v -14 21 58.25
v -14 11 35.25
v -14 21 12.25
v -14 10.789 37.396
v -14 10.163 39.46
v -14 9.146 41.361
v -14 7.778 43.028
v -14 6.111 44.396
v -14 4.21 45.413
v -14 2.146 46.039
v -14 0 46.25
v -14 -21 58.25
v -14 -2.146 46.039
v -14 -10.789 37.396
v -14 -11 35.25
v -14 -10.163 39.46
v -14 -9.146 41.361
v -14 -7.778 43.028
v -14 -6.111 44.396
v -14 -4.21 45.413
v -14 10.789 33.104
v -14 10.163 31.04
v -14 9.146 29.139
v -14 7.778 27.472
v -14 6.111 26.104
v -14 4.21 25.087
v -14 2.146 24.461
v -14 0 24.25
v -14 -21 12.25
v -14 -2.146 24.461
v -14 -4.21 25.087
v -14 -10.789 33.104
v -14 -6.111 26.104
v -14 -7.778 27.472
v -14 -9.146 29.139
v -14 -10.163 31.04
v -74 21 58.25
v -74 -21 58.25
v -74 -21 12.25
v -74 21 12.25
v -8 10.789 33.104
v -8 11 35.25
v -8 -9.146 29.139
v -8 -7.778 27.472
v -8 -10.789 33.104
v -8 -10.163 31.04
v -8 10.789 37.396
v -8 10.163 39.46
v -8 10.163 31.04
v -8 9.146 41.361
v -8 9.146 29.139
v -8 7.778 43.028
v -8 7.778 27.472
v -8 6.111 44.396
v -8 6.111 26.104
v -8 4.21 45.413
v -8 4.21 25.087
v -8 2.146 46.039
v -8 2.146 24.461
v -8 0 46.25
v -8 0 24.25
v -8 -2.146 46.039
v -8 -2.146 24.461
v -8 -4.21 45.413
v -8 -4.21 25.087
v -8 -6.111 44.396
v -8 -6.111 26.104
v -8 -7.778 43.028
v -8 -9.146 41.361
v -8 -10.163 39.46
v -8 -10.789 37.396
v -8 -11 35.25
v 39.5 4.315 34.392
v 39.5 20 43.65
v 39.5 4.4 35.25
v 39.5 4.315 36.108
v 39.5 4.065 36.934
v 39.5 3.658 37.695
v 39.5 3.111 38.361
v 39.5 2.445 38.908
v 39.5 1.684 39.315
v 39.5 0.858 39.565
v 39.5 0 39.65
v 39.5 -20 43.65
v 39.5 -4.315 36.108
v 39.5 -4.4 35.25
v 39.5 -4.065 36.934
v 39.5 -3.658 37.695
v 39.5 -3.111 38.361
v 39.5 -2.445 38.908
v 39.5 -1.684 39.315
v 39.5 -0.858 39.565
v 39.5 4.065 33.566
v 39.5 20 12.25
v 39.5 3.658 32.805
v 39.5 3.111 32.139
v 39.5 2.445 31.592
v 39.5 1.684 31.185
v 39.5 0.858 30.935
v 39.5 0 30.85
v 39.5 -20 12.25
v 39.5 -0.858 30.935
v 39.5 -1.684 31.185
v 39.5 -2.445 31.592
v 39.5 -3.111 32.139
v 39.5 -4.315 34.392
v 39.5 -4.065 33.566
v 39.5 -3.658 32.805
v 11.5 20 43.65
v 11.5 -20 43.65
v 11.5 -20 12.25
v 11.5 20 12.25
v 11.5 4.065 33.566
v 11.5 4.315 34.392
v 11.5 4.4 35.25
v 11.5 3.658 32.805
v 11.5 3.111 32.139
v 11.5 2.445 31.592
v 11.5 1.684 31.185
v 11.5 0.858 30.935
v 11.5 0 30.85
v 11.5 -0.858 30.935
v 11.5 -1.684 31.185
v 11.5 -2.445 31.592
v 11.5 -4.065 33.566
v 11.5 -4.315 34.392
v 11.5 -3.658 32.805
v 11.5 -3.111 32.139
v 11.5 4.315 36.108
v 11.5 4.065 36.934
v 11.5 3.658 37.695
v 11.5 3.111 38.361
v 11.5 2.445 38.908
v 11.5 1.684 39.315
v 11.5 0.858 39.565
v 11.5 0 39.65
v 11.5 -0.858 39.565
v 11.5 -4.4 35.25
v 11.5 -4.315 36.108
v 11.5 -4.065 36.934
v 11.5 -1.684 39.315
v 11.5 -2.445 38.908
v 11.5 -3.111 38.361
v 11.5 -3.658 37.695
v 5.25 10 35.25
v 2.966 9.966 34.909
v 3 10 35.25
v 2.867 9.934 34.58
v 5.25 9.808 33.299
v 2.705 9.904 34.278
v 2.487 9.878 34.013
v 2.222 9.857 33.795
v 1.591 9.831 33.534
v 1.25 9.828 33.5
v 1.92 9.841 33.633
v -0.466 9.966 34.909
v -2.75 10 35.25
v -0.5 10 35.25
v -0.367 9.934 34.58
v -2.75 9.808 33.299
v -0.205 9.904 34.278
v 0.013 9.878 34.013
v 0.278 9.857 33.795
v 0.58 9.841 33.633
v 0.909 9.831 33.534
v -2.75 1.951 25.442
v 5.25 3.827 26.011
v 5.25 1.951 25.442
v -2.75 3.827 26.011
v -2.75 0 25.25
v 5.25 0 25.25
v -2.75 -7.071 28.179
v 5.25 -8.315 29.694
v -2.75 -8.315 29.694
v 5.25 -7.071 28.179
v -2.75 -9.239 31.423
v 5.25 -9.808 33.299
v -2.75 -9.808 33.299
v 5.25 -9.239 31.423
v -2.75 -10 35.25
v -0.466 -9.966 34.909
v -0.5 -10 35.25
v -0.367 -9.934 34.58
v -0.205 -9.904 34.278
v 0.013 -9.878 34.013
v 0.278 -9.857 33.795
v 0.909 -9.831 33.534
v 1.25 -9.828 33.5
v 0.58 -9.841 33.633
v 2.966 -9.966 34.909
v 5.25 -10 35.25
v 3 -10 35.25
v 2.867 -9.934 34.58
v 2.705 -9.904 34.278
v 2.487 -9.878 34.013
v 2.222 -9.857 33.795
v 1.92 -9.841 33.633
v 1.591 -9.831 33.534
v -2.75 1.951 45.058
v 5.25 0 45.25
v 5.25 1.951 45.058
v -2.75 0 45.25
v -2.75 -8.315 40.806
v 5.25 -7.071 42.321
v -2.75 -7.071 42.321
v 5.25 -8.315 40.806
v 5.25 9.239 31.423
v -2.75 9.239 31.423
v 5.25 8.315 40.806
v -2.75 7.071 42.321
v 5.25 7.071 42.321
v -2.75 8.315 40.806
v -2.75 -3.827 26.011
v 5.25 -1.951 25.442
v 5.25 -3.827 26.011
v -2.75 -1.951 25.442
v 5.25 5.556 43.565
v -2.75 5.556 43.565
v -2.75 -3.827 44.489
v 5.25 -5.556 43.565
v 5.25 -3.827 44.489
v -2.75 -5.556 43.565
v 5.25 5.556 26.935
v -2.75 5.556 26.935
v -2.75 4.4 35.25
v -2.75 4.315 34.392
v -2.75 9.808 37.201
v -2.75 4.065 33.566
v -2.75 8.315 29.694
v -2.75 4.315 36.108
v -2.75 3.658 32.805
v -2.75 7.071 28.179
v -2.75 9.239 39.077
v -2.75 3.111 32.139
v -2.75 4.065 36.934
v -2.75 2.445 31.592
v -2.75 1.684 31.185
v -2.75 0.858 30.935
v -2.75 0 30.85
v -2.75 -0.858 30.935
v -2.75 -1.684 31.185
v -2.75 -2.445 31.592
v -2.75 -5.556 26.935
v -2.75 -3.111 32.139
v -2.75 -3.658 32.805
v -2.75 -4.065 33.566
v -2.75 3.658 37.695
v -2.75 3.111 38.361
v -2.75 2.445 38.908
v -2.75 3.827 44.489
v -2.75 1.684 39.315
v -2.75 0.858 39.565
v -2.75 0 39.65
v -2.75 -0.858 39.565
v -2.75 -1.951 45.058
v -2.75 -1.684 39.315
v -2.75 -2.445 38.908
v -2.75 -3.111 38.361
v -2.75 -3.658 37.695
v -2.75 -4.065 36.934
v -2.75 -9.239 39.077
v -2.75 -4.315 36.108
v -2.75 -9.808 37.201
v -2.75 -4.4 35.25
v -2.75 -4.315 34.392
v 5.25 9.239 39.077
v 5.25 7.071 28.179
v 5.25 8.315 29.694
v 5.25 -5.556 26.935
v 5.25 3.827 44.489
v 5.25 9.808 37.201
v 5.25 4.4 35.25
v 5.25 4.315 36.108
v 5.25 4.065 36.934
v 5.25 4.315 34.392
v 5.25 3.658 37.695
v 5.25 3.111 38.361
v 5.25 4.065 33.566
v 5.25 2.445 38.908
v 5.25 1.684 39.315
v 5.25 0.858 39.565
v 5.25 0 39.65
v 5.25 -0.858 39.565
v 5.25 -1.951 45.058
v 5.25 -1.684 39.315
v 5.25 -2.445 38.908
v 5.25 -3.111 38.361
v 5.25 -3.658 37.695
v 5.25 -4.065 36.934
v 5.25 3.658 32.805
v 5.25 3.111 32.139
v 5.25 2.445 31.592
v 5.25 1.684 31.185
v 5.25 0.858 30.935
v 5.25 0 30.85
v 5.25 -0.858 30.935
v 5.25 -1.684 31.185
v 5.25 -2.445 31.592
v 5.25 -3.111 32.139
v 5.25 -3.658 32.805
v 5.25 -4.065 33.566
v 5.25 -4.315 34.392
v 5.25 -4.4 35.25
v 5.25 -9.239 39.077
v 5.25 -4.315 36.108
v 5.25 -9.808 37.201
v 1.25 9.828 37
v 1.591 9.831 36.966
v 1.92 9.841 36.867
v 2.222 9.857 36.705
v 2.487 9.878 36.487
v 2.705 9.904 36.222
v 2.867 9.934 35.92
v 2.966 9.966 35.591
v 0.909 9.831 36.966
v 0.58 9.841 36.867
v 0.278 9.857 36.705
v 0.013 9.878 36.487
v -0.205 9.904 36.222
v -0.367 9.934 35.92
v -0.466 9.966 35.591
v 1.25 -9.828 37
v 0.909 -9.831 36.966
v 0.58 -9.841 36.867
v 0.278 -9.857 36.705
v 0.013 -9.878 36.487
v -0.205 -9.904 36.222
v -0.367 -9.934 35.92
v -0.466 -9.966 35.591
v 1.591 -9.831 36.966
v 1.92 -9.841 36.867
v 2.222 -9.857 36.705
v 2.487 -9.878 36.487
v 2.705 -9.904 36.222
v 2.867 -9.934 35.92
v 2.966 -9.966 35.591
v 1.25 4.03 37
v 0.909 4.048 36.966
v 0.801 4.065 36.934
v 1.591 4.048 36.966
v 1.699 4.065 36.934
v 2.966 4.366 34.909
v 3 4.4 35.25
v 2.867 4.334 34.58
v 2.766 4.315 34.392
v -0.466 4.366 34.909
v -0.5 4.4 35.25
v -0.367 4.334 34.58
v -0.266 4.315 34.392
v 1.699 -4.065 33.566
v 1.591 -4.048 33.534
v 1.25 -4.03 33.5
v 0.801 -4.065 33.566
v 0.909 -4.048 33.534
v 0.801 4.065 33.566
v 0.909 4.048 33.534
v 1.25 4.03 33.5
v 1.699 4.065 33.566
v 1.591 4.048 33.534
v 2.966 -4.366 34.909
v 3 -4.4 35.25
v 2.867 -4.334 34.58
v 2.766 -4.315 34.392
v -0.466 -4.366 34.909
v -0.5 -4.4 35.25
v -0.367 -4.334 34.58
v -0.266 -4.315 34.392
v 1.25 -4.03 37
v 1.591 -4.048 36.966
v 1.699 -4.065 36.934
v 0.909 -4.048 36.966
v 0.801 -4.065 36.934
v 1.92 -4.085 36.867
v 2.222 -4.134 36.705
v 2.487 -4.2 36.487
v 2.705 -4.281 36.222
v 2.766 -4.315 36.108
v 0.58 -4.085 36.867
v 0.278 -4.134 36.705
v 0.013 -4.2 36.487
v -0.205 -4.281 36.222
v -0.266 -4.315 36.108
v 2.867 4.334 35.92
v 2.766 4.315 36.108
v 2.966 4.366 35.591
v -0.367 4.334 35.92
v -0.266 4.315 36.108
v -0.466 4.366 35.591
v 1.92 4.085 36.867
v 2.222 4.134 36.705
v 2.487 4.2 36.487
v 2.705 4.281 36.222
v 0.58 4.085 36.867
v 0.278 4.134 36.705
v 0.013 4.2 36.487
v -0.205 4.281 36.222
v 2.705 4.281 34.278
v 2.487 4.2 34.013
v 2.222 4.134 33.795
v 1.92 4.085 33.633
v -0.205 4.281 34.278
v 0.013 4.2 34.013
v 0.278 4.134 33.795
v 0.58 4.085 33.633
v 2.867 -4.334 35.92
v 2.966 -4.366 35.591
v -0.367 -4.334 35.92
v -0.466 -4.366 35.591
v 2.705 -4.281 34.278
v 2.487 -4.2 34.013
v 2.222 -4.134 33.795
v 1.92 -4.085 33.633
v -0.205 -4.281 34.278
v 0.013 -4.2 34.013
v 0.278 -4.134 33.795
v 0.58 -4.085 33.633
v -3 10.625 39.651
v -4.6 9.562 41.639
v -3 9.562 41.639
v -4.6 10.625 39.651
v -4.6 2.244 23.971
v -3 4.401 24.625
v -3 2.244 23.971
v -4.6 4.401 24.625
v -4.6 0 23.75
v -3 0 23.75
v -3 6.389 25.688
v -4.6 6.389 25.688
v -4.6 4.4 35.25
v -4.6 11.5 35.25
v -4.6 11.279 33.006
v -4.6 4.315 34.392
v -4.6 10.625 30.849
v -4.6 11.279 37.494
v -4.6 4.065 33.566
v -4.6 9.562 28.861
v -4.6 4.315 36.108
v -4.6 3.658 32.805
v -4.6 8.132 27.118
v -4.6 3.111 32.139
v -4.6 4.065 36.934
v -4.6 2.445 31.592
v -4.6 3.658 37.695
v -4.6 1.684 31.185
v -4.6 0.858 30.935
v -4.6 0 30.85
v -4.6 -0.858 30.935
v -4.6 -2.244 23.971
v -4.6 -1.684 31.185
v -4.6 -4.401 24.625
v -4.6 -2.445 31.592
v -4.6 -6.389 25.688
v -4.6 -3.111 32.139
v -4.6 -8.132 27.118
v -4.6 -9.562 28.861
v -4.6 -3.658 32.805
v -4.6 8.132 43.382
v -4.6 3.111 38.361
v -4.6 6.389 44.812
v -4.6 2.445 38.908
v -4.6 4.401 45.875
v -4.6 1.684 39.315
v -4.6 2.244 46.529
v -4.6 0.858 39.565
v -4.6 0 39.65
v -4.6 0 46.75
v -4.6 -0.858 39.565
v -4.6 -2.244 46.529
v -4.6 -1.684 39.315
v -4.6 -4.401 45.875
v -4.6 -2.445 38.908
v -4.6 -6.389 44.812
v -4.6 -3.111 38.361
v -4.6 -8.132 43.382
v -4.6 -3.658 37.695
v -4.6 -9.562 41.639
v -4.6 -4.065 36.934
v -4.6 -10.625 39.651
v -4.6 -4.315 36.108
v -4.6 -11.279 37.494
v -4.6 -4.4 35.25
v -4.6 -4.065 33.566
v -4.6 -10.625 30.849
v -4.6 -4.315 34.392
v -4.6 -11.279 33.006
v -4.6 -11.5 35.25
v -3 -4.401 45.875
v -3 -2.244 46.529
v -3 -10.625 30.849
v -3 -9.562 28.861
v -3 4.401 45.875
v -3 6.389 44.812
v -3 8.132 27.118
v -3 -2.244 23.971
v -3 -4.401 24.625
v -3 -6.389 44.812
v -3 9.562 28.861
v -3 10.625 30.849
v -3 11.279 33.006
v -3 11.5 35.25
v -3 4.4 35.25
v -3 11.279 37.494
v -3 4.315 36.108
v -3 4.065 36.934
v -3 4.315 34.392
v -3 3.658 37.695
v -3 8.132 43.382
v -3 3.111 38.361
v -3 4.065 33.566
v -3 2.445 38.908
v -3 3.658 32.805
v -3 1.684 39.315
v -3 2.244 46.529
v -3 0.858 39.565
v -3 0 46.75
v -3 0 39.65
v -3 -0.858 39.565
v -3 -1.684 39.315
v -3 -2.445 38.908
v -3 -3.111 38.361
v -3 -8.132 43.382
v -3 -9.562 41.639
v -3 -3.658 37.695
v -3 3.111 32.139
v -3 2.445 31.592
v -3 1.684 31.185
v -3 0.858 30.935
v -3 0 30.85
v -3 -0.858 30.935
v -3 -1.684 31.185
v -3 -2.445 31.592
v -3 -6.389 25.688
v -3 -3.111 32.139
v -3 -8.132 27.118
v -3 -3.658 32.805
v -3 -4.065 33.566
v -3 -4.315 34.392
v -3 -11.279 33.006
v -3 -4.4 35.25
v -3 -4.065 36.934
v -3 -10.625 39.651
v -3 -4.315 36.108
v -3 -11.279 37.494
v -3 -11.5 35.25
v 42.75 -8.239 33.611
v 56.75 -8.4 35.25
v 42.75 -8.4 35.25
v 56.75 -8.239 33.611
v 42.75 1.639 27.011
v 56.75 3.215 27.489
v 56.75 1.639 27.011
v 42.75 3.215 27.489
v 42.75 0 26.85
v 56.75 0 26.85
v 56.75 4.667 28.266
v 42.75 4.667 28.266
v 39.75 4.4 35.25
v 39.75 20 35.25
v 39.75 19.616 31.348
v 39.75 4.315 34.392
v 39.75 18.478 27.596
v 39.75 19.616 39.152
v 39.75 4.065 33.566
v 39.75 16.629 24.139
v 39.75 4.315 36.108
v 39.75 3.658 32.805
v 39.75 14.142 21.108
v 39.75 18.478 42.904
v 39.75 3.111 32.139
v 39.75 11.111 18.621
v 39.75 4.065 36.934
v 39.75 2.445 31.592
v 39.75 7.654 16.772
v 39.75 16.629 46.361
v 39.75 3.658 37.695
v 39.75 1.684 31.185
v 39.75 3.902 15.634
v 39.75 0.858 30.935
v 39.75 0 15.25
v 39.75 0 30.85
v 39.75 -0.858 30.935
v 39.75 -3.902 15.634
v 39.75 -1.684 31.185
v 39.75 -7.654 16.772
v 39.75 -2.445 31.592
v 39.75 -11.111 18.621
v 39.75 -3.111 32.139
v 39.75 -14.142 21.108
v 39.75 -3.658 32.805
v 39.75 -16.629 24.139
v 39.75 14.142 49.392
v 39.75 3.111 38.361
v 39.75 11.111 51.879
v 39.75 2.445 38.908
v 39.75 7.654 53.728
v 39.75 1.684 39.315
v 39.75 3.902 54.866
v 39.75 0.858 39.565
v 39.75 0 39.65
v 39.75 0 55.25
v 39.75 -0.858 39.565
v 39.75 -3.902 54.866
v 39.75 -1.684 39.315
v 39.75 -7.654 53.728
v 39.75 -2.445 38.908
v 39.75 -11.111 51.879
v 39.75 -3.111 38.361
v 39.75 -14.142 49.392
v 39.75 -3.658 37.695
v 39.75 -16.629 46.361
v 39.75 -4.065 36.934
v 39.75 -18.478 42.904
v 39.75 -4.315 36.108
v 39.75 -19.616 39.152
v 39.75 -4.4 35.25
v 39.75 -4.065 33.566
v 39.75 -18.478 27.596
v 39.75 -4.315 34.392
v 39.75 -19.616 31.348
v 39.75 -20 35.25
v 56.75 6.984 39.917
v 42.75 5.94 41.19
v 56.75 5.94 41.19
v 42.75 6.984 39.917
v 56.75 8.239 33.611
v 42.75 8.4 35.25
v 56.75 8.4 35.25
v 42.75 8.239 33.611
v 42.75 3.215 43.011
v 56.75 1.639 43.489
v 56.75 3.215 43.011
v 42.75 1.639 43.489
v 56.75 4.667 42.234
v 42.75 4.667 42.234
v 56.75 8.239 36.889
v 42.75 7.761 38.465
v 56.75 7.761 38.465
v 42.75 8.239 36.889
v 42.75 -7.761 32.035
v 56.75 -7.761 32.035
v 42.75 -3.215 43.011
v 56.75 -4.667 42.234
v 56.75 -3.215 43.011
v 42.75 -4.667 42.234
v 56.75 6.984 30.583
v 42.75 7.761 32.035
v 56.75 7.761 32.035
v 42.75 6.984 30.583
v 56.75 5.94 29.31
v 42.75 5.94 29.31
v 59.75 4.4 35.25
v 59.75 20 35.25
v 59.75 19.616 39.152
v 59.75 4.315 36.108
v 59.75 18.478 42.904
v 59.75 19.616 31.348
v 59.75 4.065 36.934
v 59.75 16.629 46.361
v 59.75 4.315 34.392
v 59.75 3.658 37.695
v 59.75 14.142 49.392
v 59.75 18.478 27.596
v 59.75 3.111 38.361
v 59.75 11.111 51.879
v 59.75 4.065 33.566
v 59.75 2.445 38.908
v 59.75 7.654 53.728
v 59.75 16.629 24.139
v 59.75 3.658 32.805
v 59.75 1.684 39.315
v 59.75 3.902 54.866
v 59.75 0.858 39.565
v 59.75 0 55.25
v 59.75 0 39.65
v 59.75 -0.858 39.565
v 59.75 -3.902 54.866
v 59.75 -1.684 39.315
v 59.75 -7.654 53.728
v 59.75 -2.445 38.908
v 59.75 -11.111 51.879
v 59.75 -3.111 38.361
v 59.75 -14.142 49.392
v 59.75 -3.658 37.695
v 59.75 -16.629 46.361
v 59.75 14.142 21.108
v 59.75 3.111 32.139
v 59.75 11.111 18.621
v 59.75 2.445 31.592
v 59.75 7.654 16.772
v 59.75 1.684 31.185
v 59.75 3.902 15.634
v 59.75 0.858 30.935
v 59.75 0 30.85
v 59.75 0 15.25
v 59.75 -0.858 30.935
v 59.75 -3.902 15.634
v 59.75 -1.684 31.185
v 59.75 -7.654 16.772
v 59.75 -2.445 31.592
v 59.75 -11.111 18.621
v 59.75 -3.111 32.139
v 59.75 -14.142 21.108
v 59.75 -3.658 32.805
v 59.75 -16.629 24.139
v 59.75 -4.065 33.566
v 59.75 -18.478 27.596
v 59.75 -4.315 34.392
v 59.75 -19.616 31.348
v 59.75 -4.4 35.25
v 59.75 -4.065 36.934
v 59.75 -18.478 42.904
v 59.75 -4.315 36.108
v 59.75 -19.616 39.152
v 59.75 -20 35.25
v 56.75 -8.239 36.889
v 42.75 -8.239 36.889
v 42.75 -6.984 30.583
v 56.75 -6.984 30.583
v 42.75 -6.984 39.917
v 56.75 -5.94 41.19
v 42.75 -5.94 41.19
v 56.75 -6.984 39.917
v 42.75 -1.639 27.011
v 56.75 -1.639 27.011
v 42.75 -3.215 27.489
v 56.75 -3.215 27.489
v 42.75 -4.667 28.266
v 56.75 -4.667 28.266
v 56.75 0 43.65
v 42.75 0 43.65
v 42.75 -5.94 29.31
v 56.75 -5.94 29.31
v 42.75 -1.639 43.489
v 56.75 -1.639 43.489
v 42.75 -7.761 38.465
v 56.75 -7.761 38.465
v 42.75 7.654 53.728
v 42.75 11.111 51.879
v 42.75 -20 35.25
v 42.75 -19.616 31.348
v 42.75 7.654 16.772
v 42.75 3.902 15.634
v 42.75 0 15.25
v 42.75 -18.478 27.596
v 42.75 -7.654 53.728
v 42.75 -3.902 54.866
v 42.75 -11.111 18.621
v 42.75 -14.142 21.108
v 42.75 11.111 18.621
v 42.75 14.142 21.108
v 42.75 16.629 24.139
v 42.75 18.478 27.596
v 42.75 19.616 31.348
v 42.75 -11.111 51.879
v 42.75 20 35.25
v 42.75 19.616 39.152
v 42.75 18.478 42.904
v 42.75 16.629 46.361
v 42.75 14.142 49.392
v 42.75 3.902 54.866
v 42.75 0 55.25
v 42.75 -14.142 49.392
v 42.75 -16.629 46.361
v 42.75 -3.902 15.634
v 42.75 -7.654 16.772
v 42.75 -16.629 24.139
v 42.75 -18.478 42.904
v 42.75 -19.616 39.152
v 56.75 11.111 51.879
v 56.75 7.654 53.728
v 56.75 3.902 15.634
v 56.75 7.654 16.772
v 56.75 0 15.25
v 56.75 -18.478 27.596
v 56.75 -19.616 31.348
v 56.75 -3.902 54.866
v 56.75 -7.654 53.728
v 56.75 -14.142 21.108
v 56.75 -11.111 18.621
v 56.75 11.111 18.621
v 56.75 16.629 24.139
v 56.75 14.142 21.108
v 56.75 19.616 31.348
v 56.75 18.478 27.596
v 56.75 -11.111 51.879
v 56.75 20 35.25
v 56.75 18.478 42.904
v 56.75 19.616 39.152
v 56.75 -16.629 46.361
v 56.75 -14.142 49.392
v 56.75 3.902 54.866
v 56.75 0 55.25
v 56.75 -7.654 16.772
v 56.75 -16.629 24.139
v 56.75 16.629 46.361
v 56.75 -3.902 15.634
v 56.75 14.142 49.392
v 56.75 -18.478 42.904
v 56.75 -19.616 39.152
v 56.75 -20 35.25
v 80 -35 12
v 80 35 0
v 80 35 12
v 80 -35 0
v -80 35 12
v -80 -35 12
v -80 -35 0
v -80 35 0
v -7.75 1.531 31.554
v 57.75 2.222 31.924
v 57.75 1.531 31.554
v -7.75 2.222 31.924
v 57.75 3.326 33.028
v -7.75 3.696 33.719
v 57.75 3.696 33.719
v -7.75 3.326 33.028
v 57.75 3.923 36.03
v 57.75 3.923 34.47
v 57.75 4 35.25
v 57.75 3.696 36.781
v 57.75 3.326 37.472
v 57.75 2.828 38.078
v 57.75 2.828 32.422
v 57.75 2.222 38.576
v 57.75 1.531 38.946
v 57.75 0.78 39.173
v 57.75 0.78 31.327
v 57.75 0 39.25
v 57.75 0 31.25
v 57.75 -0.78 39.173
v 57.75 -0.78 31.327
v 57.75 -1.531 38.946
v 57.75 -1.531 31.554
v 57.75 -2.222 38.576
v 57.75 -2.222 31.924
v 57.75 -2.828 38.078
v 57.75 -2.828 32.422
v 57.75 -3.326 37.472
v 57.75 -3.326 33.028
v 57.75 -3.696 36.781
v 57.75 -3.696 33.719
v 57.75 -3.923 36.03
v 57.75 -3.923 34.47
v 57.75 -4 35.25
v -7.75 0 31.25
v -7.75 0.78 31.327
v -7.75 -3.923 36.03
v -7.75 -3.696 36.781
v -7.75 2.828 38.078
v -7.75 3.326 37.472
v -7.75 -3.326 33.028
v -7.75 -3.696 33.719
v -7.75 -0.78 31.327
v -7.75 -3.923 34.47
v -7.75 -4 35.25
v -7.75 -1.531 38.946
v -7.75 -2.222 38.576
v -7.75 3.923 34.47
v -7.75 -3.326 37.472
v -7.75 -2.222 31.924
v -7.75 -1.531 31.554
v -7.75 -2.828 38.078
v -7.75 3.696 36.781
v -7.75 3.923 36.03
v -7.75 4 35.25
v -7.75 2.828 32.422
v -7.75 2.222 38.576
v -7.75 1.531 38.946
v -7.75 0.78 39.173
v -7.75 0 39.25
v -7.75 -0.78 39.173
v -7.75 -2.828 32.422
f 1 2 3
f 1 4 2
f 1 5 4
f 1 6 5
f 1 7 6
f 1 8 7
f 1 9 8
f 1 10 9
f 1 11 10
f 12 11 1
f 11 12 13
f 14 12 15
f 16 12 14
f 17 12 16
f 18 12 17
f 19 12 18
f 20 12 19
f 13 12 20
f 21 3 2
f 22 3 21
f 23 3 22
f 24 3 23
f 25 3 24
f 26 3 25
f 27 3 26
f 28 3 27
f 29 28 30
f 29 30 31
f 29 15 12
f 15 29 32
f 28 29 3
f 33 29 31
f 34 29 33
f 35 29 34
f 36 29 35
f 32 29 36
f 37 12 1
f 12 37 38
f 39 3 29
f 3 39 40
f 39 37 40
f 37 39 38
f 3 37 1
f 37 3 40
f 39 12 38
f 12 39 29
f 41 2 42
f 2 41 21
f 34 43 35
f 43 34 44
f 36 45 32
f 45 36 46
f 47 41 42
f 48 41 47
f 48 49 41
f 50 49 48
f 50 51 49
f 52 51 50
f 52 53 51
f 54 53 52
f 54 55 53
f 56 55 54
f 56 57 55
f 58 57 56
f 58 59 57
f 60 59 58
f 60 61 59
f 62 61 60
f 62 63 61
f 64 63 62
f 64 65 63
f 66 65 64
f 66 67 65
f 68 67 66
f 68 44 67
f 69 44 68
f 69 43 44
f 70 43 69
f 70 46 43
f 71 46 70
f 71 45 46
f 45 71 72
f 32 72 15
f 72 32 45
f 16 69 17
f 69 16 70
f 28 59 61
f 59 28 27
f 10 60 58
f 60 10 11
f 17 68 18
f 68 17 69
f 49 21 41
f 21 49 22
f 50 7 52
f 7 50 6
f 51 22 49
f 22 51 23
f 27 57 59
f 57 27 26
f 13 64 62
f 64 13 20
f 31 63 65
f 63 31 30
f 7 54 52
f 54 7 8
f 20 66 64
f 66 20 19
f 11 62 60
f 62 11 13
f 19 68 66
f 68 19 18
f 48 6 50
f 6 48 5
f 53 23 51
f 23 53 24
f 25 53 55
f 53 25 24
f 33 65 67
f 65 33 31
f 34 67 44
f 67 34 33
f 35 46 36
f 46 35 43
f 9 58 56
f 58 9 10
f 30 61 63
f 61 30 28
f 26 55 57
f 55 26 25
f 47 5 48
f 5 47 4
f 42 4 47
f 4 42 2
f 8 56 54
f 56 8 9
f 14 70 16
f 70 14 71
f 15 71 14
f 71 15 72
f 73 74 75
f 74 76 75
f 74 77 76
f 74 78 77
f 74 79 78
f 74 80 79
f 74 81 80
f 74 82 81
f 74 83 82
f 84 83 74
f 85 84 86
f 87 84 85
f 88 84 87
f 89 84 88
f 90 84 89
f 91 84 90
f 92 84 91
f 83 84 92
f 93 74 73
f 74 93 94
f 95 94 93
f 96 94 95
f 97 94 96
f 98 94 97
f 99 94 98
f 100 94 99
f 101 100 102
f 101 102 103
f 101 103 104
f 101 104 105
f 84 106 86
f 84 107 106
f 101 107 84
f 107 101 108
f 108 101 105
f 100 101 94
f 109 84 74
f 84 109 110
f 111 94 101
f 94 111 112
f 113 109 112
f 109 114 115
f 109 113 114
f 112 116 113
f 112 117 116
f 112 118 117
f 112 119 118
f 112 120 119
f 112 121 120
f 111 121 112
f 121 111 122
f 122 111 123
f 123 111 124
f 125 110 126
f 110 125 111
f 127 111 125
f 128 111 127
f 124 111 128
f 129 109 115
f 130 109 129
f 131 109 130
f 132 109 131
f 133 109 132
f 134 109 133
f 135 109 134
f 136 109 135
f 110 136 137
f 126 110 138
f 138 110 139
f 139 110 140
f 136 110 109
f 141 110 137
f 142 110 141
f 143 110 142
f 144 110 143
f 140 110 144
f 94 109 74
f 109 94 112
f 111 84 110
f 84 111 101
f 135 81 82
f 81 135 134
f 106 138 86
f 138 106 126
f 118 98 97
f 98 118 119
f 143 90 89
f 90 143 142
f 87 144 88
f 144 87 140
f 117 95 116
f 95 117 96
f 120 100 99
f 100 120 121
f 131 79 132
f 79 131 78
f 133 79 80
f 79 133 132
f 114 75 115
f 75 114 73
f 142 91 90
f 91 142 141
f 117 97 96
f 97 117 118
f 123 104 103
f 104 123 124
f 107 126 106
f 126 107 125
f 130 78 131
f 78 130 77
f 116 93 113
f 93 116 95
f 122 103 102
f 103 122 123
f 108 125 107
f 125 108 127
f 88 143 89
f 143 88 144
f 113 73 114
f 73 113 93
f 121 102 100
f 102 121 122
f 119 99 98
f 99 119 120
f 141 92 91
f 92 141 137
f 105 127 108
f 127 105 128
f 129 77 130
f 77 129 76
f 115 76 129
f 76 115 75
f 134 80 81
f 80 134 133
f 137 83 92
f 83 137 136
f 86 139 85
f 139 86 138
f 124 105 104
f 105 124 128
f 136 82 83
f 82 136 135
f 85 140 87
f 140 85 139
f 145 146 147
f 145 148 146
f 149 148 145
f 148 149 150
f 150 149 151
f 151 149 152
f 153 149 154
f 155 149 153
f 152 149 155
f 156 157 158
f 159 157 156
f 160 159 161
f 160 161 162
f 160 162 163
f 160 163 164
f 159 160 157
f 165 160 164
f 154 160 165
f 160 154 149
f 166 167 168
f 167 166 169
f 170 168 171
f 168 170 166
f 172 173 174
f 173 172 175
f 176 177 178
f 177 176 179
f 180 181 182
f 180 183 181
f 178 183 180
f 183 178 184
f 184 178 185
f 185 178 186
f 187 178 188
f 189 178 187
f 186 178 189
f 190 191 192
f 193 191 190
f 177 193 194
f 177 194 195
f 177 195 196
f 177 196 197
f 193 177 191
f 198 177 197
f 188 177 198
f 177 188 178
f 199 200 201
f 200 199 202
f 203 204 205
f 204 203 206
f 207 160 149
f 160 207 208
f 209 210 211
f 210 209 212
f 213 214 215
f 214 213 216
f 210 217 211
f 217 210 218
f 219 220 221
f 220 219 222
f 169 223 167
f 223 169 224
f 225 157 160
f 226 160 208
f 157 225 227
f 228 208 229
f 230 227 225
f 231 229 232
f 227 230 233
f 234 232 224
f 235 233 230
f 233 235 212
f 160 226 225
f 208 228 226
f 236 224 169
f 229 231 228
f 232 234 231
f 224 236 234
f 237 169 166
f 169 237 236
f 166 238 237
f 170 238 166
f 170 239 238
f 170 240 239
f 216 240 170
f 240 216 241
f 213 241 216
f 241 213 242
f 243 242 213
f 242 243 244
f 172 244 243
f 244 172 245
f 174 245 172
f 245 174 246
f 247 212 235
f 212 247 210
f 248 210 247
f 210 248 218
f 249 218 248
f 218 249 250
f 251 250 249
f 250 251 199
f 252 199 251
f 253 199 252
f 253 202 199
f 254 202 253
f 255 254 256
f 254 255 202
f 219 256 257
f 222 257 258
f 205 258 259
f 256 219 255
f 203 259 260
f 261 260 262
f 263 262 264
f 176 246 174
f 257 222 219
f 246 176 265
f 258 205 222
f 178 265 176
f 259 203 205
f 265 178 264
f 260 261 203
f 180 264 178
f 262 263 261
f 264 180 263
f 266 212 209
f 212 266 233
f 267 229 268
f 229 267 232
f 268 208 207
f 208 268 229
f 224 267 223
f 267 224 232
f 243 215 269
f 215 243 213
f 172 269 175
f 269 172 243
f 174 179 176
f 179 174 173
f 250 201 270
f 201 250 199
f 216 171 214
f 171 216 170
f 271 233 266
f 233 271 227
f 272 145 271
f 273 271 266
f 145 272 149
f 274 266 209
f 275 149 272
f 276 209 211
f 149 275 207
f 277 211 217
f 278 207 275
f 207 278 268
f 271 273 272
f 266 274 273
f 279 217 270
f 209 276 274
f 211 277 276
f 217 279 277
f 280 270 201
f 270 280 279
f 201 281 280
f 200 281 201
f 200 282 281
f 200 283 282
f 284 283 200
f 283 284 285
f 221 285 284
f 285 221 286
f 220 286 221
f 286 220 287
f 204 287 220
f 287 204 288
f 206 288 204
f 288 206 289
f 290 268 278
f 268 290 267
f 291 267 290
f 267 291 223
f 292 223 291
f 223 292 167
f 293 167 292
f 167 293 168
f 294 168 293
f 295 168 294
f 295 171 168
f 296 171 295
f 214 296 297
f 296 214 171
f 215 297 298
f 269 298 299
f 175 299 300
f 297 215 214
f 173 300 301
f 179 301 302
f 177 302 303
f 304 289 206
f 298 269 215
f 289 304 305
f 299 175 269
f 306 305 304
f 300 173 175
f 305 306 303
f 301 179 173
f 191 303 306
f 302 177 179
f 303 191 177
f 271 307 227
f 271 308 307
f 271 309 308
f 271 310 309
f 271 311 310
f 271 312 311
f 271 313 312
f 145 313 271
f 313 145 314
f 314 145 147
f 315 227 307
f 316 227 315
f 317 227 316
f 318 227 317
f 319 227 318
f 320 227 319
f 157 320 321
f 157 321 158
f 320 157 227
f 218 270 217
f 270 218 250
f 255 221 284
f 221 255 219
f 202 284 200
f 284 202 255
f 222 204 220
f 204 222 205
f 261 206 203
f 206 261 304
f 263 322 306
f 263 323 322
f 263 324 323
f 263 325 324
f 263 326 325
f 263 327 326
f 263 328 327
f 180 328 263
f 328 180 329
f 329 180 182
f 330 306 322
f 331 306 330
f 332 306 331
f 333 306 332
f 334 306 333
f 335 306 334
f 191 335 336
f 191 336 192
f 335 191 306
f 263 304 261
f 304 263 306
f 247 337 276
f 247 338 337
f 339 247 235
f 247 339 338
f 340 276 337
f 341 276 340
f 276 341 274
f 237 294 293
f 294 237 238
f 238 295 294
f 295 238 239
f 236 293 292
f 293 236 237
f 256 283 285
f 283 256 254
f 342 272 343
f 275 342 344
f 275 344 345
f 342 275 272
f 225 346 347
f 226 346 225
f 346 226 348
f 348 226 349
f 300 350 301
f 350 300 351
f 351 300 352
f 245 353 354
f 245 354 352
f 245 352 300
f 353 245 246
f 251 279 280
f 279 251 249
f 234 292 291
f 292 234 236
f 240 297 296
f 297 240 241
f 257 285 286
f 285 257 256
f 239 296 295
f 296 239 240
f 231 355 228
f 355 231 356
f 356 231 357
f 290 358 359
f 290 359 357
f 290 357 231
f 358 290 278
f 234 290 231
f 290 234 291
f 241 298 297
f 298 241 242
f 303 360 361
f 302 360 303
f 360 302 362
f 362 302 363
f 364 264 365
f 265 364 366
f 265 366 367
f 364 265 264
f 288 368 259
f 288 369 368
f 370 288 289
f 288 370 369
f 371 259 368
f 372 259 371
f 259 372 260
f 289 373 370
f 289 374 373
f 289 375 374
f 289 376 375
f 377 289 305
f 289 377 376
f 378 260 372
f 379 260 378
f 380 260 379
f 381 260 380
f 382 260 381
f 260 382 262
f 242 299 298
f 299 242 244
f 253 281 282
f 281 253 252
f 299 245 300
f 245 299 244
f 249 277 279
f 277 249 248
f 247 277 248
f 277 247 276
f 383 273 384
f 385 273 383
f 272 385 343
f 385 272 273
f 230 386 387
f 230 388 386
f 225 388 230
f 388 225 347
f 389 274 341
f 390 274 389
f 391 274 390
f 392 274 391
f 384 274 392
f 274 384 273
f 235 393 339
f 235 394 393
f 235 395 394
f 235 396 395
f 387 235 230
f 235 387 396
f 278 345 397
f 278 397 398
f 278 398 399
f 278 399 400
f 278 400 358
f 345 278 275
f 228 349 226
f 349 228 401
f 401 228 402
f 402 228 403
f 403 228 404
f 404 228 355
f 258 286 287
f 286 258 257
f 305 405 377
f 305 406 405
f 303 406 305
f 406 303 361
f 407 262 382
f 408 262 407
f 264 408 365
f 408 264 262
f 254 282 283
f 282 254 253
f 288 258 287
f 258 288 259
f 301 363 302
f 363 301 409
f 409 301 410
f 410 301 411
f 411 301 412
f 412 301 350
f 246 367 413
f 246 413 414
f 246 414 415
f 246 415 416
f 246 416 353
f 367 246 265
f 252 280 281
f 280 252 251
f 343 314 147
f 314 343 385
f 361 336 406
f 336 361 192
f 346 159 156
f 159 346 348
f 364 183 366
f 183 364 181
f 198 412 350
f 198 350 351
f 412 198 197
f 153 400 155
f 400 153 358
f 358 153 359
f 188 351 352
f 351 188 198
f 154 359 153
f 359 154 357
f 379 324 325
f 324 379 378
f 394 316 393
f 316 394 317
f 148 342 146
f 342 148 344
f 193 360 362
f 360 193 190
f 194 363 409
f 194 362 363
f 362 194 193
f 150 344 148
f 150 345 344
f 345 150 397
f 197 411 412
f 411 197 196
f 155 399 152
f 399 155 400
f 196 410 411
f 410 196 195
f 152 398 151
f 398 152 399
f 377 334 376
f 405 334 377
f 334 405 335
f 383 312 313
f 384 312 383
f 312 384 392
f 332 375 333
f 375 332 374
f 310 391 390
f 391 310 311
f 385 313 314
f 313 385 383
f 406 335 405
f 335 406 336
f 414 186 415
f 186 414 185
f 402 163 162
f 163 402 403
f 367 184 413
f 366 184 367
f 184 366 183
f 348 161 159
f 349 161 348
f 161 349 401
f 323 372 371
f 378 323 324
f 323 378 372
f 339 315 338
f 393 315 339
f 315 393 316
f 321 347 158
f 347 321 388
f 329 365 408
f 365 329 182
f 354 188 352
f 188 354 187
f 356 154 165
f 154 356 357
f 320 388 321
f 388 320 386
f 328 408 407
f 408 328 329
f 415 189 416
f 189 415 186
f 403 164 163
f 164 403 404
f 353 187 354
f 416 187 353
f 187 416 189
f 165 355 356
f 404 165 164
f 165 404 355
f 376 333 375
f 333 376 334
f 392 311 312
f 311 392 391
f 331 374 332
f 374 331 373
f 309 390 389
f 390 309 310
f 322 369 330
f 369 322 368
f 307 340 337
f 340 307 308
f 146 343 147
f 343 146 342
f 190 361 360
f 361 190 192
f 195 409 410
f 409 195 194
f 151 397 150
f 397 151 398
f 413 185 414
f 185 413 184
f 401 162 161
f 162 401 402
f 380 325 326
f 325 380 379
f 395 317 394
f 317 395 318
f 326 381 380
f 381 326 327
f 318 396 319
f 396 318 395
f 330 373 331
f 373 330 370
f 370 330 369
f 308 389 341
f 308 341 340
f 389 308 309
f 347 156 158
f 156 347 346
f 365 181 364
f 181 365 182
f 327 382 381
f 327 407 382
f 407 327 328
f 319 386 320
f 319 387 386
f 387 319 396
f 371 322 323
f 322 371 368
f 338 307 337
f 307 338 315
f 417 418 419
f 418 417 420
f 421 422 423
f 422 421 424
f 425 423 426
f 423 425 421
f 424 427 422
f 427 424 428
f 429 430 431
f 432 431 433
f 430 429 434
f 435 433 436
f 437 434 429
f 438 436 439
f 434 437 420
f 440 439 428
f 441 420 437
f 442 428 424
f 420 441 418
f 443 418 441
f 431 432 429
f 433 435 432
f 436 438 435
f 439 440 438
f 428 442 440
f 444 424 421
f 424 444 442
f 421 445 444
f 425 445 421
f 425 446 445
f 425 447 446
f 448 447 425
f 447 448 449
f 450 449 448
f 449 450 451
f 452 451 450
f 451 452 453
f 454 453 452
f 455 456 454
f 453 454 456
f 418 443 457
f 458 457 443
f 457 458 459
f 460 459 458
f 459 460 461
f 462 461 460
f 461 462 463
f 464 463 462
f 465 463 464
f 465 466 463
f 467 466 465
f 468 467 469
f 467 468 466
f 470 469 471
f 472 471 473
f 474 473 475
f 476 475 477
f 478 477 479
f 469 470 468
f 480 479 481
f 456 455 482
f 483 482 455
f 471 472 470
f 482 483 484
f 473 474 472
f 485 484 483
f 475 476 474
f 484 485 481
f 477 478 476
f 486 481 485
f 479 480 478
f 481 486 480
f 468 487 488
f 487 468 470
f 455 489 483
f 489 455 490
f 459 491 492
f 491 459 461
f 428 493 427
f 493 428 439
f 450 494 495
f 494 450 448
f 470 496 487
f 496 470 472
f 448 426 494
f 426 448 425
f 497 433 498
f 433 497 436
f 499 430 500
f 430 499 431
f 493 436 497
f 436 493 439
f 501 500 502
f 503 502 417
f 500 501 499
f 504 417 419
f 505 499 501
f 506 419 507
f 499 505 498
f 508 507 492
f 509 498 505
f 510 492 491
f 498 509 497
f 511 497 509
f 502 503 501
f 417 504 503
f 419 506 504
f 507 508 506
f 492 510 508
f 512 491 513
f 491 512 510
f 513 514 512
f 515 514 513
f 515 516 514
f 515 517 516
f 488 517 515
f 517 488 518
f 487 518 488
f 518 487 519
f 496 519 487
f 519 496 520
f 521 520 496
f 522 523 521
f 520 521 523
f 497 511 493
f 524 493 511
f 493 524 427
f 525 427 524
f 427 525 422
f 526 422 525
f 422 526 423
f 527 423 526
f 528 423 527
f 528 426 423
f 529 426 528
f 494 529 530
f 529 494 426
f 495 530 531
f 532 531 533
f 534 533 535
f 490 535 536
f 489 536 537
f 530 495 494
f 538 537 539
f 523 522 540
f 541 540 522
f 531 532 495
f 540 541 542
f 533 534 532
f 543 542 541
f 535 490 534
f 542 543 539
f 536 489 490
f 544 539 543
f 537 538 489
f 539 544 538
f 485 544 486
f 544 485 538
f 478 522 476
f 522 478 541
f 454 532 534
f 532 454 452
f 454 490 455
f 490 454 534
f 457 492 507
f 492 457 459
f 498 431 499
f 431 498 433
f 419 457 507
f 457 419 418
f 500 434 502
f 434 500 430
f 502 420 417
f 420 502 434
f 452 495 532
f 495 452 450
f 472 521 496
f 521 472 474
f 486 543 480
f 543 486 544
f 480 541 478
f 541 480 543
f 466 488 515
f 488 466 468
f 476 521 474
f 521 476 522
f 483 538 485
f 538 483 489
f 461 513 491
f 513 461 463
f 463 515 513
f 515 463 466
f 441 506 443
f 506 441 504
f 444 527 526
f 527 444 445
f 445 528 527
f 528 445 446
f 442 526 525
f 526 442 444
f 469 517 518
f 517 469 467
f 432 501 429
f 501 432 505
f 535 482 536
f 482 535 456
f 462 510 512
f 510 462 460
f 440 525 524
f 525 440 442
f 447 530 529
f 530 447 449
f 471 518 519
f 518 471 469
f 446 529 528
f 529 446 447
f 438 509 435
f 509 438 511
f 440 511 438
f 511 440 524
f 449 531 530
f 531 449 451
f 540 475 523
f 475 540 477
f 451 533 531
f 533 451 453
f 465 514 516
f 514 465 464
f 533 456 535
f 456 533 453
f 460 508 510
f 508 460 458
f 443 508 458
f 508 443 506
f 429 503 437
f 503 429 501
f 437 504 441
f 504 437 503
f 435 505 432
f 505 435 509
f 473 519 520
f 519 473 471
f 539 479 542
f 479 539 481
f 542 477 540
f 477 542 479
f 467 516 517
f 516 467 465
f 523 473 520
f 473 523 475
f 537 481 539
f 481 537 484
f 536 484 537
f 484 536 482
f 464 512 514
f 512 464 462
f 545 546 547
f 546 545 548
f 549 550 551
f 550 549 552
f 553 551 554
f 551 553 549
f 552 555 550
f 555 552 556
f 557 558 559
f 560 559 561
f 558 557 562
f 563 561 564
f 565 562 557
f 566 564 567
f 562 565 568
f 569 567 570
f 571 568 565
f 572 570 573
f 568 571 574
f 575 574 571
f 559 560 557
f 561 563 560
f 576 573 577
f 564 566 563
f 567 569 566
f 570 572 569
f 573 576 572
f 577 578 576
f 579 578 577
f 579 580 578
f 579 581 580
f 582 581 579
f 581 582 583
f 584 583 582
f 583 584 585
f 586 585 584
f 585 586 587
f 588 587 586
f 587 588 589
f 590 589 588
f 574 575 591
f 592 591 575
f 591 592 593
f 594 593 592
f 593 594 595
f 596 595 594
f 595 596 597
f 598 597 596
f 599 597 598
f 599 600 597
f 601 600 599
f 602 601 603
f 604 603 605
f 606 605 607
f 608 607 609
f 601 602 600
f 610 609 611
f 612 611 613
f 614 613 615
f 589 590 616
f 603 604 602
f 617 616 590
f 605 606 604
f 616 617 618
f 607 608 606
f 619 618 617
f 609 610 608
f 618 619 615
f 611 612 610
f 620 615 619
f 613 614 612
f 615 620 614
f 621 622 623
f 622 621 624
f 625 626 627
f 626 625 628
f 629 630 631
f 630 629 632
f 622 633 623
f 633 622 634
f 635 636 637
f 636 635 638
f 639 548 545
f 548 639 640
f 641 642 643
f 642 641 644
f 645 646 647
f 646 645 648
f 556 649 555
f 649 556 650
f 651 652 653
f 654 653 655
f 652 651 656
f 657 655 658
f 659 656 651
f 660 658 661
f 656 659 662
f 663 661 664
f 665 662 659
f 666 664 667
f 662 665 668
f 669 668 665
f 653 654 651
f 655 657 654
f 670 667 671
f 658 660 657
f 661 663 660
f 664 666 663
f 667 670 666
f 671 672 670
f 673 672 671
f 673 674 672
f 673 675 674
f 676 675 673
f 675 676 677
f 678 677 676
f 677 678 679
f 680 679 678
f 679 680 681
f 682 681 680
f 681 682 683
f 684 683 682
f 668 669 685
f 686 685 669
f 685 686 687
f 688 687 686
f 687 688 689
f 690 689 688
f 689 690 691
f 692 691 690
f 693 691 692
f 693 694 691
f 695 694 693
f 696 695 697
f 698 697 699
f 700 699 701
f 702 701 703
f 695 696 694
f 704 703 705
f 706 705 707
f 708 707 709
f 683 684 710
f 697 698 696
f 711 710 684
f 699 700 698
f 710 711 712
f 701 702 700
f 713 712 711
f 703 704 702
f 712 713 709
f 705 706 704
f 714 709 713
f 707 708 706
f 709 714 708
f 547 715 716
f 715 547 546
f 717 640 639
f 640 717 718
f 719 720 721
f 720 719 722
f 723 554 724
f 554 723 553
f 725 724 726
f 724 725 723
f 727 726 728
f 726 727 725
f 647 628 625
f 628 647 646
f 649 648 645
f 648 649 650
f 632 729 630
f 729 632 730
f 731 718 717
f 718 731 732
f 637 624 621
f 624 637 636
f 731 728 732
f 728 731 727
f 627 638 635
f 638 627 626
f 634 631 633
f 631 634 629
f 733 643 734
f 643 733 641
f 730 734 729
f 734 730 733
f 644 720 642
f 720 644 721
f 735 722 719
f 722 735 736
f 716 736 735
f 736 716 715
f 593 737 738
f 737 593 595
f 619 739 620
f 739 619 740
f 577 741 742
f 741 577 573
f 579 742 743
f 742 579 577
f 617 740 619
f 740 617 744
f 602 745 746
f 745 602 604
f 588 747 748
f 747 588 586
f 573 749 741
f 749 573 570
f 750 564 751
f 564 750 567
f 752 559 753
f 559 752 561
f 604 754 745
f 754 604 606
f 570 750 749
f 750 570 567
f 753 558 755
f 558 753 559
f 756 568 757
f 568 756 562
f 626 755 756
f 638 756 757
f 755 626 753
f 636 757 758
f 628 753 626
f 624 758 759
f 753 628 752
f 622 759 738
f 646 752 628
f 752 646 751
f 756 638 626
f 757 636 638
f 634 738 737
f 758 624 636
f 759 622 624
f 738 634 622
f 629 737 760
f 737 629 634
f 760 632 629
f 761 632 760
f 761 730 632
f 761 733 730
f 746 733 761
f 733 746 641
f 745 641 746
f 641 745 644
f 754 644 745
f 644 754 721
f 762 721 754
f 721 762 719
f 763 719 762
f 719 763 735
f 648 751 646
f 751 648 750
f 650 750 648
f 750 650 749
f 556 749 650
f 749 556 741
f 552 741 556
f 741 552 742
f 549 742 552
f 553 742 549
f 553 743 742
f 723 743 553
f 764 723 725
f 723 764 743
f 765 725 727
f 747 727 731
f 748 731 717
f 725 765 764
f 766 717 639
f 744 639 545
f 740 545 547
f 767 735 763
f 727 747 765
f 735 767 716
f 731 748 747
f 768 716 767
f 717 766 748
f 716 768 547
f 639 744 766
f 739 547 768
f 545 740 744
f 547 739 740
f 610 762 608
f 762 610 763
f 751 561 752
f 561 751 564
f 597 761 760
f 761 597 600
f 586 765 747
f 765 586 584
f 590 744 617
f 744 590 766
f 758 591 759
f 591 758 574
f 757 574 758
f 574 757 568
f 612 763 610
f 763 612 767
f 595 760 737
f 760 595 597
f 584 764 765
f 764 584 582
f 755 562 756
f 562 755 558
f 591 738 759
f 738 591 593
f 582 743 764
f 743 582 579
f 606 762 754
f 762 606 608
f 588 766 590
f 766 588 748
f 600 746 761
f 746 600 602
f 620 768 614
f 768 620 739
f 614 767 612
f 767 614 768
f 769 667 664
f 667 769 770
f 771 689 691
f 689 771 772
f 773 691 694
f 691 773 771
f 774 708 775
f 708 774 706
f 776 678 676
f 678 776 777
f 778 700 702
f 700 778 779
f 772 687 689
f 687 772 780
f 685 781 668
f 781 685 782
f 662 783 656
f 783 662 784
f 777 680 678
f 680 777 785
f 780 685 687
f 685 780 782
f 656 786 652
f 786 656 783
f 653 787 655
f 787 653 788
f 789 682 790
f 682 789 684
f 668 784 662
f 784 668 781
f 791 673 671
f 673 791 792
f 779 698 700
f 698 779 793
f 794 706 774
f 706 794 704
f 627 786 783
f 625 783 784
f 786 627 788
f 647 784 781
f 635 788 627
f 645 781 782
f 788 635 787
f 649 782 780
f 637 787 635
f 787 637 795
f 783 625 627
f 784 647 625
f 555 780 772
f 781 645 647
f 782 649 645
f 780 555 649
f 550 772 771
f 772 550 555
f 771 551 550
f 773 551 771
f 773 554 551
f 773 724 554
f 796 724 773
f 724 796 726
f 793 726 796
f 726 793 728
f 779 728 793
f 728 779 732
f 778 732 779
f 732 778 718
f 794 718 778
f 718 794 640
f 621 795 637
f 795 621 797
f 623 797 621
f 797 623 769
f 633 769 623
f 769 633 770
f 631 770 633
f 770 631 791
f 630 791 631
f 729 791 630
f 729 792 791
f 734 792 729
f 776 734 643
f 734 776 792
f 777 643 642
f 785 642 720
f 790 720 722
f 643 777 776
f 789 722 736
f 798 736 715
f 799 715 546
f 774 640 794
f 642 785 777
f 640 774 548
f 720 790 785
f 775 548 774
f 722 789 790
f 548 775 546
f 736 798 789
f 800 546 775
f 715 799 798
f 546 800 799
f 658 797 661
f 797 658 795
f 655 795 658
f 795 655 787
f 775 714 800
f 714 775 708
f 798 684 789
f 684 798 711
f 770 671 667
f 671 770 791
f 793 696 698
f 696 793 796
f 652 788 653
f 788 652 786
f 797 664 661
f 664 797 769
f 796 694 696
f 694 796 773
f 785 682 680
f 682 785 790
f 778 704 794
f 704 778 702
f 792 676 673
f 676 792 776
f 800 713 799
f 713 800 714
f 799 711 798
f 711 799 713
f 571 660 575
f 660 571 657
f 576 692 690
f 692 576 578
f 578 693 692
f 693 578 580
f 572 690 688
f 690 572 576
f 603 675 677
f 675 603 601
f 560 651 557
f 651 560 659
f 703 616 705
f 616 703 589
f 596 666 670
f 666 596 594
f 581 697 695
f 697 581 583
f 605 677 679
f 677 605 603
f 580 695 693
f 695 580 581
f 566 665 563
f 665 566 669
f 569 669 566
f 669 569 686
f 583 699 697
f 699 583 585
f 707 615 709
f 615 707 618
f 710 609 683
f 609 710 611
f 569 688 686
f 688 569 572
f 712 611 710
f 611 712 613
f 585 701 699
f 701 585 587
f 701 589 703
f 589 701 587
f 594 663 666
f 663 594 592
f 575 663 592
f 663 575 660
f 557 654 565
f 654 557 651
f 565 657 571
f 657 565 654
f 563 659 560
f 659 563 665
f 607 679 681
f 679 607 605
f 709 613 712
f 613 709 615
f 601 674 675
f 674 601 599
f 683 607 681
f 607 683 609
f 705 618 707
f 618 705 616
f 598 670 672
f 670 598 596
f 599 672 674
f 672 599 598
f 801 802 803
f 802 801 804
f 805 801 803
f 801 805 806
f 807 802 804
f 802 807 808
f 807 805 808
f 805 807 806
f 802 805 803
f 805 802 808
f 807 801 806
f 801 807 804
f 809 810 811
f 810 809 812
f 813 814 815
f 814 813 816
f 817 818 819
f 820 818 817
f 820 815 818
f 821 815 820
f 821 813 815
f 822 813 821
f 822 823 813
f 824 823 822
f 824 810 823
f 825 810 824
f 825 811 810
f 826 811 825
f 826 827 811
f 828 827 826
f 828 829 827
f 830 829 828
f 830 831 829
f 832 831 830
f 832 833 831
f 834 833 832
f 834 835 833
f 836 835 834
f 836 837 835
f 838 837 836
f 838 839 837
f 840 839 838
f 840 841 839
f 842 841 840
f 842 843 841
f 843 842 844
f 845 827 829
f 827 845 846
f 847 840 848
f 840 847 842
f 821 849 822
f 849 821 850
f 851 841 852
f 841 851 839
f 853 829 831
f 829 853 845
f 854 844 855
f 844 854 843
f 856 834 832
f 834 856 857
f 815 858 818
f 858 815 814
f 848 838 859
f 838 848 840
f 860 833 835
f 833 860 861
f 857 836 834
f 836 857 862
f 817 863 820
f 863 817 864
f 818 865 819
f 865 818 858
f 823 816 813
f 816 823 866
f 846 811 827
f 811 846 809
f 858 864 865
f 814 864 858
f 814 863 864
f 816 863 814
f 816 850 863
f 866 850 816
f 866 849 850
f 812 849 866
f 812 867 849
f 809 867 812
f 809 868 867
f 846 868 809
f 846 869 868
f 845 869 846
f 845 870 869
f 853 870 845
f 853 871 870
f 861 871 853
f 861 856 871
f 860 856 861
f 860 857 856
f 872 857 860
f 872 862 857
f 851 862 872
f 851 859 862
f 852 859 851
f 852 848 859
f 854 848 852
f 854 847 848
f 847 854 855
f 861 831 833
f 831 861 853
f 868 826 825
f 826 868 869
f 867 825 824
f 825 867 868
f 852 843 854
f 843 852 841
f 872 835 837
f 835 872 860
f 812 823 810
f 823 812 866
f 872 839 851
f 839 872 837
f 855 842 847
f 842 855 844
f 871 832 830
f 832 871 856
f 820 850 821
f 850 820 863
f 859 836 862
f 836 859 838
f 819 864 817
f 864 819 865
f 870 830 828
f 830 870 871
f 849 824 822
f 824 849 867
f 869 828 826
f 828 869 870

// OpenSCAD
$fn = 32;

// ------------------------------------------------------------------------
// Motor drive station: motor 60 x 46 mm, shaft d8, pulley d40
// Every part is its own module, assembly() places every instance.
// ------------------------------------------------------------------------

// --- part 1 ---
module station_bed() {
  difference() {
    translate([-80, -35, 0]) cube([160, 70, 12]);
  }
}

// --- part 2 ---
module drive_motor() {
  union() {
    translate([-30, -21, 0]) cube([60, 42, 46]);
    translate([33, 0, 23]) rotate([0, 90, 0]) cylinder(h = 6, d = 22, center = true);
  }
}

// --- part 3 ---
module pillow_block() {
  difference() {
    translate([-14, -20, 0]) cube([28, 40, 31.4]);
    translate([0, 0, 23]) rotate([0, 90, 0]) cylinder(h = 30, d = 8.8, center = true);
  }
}

// --- part 4 ---
module drive_shaft() {
  translate([0, 0, -32.75]) cylinder(h = 65.5, d = 8);
}

// --- part 5 ---
module shaft_collar() {
  difference() {
    cylinder(h = 8, d = 20);
    translate([0, 0, -1]) cylinder(h = 10, d = 8.8);
    translate([0, 0, 4]) rotate([90, 0, 0]) cylinder(h = 22, d = 3.5, center = true);
  }
}

// --- part 6 ---
module collar_washer() {
  difference() {
      translate([0, 0, 0]) cylinder(h = 1.6, d = 23);
      translate([0, 0, -1]) cylinder(h = 3.6, d = 8.8);
    }
}

// --- part 7 ---
module drive_pulley() {
  difference() {
    union() {
      cylinder(h = 20, d = 16.8);
      cylinder(h = 3, d = 40);
      translate([0, 0, 17]) cylinder(h = 3, d = 40);
    }
    translate([0, 0, -1]) cylinder(h = 22, d = 8.8);
  }
}

// --- assembly ---
module assembly() {
  color([0.80, 0.24, 0.20]) translate([0, 0, 0]) rotate([0, 0, 0]) station_bed();
  color([0.20, 0.45, 0.75]) translate([-44, 0, 12.25]) rotate([0, 0, 0]) drive_motor();
  color([0.25, 0.62, 0.32]) translate([25.5, 0, 12.25]) rotate([0, 0, 0]) pillow_block();
  color([0.92, 0.70, 0.18]) translate([25, 0, 35.25]) rotate([0, 90, 0]) drive_shaft();
  color([0.58, 0.35, 0.70]) translate([-2.75, 0, 35.25]) rotate([0, 90, 0]) shaft_collar();
  color([0.16, 0.66, 0.66]) translate([-4.6, 0, 35.25]) rotate([0, 90, 0]) collar_washer();
  color([0.85, 0.48, 0.18]) translate([39.75, 0, 35.25]) rotate([0, 90, 0]) drive_pulley();
}

assembly();
